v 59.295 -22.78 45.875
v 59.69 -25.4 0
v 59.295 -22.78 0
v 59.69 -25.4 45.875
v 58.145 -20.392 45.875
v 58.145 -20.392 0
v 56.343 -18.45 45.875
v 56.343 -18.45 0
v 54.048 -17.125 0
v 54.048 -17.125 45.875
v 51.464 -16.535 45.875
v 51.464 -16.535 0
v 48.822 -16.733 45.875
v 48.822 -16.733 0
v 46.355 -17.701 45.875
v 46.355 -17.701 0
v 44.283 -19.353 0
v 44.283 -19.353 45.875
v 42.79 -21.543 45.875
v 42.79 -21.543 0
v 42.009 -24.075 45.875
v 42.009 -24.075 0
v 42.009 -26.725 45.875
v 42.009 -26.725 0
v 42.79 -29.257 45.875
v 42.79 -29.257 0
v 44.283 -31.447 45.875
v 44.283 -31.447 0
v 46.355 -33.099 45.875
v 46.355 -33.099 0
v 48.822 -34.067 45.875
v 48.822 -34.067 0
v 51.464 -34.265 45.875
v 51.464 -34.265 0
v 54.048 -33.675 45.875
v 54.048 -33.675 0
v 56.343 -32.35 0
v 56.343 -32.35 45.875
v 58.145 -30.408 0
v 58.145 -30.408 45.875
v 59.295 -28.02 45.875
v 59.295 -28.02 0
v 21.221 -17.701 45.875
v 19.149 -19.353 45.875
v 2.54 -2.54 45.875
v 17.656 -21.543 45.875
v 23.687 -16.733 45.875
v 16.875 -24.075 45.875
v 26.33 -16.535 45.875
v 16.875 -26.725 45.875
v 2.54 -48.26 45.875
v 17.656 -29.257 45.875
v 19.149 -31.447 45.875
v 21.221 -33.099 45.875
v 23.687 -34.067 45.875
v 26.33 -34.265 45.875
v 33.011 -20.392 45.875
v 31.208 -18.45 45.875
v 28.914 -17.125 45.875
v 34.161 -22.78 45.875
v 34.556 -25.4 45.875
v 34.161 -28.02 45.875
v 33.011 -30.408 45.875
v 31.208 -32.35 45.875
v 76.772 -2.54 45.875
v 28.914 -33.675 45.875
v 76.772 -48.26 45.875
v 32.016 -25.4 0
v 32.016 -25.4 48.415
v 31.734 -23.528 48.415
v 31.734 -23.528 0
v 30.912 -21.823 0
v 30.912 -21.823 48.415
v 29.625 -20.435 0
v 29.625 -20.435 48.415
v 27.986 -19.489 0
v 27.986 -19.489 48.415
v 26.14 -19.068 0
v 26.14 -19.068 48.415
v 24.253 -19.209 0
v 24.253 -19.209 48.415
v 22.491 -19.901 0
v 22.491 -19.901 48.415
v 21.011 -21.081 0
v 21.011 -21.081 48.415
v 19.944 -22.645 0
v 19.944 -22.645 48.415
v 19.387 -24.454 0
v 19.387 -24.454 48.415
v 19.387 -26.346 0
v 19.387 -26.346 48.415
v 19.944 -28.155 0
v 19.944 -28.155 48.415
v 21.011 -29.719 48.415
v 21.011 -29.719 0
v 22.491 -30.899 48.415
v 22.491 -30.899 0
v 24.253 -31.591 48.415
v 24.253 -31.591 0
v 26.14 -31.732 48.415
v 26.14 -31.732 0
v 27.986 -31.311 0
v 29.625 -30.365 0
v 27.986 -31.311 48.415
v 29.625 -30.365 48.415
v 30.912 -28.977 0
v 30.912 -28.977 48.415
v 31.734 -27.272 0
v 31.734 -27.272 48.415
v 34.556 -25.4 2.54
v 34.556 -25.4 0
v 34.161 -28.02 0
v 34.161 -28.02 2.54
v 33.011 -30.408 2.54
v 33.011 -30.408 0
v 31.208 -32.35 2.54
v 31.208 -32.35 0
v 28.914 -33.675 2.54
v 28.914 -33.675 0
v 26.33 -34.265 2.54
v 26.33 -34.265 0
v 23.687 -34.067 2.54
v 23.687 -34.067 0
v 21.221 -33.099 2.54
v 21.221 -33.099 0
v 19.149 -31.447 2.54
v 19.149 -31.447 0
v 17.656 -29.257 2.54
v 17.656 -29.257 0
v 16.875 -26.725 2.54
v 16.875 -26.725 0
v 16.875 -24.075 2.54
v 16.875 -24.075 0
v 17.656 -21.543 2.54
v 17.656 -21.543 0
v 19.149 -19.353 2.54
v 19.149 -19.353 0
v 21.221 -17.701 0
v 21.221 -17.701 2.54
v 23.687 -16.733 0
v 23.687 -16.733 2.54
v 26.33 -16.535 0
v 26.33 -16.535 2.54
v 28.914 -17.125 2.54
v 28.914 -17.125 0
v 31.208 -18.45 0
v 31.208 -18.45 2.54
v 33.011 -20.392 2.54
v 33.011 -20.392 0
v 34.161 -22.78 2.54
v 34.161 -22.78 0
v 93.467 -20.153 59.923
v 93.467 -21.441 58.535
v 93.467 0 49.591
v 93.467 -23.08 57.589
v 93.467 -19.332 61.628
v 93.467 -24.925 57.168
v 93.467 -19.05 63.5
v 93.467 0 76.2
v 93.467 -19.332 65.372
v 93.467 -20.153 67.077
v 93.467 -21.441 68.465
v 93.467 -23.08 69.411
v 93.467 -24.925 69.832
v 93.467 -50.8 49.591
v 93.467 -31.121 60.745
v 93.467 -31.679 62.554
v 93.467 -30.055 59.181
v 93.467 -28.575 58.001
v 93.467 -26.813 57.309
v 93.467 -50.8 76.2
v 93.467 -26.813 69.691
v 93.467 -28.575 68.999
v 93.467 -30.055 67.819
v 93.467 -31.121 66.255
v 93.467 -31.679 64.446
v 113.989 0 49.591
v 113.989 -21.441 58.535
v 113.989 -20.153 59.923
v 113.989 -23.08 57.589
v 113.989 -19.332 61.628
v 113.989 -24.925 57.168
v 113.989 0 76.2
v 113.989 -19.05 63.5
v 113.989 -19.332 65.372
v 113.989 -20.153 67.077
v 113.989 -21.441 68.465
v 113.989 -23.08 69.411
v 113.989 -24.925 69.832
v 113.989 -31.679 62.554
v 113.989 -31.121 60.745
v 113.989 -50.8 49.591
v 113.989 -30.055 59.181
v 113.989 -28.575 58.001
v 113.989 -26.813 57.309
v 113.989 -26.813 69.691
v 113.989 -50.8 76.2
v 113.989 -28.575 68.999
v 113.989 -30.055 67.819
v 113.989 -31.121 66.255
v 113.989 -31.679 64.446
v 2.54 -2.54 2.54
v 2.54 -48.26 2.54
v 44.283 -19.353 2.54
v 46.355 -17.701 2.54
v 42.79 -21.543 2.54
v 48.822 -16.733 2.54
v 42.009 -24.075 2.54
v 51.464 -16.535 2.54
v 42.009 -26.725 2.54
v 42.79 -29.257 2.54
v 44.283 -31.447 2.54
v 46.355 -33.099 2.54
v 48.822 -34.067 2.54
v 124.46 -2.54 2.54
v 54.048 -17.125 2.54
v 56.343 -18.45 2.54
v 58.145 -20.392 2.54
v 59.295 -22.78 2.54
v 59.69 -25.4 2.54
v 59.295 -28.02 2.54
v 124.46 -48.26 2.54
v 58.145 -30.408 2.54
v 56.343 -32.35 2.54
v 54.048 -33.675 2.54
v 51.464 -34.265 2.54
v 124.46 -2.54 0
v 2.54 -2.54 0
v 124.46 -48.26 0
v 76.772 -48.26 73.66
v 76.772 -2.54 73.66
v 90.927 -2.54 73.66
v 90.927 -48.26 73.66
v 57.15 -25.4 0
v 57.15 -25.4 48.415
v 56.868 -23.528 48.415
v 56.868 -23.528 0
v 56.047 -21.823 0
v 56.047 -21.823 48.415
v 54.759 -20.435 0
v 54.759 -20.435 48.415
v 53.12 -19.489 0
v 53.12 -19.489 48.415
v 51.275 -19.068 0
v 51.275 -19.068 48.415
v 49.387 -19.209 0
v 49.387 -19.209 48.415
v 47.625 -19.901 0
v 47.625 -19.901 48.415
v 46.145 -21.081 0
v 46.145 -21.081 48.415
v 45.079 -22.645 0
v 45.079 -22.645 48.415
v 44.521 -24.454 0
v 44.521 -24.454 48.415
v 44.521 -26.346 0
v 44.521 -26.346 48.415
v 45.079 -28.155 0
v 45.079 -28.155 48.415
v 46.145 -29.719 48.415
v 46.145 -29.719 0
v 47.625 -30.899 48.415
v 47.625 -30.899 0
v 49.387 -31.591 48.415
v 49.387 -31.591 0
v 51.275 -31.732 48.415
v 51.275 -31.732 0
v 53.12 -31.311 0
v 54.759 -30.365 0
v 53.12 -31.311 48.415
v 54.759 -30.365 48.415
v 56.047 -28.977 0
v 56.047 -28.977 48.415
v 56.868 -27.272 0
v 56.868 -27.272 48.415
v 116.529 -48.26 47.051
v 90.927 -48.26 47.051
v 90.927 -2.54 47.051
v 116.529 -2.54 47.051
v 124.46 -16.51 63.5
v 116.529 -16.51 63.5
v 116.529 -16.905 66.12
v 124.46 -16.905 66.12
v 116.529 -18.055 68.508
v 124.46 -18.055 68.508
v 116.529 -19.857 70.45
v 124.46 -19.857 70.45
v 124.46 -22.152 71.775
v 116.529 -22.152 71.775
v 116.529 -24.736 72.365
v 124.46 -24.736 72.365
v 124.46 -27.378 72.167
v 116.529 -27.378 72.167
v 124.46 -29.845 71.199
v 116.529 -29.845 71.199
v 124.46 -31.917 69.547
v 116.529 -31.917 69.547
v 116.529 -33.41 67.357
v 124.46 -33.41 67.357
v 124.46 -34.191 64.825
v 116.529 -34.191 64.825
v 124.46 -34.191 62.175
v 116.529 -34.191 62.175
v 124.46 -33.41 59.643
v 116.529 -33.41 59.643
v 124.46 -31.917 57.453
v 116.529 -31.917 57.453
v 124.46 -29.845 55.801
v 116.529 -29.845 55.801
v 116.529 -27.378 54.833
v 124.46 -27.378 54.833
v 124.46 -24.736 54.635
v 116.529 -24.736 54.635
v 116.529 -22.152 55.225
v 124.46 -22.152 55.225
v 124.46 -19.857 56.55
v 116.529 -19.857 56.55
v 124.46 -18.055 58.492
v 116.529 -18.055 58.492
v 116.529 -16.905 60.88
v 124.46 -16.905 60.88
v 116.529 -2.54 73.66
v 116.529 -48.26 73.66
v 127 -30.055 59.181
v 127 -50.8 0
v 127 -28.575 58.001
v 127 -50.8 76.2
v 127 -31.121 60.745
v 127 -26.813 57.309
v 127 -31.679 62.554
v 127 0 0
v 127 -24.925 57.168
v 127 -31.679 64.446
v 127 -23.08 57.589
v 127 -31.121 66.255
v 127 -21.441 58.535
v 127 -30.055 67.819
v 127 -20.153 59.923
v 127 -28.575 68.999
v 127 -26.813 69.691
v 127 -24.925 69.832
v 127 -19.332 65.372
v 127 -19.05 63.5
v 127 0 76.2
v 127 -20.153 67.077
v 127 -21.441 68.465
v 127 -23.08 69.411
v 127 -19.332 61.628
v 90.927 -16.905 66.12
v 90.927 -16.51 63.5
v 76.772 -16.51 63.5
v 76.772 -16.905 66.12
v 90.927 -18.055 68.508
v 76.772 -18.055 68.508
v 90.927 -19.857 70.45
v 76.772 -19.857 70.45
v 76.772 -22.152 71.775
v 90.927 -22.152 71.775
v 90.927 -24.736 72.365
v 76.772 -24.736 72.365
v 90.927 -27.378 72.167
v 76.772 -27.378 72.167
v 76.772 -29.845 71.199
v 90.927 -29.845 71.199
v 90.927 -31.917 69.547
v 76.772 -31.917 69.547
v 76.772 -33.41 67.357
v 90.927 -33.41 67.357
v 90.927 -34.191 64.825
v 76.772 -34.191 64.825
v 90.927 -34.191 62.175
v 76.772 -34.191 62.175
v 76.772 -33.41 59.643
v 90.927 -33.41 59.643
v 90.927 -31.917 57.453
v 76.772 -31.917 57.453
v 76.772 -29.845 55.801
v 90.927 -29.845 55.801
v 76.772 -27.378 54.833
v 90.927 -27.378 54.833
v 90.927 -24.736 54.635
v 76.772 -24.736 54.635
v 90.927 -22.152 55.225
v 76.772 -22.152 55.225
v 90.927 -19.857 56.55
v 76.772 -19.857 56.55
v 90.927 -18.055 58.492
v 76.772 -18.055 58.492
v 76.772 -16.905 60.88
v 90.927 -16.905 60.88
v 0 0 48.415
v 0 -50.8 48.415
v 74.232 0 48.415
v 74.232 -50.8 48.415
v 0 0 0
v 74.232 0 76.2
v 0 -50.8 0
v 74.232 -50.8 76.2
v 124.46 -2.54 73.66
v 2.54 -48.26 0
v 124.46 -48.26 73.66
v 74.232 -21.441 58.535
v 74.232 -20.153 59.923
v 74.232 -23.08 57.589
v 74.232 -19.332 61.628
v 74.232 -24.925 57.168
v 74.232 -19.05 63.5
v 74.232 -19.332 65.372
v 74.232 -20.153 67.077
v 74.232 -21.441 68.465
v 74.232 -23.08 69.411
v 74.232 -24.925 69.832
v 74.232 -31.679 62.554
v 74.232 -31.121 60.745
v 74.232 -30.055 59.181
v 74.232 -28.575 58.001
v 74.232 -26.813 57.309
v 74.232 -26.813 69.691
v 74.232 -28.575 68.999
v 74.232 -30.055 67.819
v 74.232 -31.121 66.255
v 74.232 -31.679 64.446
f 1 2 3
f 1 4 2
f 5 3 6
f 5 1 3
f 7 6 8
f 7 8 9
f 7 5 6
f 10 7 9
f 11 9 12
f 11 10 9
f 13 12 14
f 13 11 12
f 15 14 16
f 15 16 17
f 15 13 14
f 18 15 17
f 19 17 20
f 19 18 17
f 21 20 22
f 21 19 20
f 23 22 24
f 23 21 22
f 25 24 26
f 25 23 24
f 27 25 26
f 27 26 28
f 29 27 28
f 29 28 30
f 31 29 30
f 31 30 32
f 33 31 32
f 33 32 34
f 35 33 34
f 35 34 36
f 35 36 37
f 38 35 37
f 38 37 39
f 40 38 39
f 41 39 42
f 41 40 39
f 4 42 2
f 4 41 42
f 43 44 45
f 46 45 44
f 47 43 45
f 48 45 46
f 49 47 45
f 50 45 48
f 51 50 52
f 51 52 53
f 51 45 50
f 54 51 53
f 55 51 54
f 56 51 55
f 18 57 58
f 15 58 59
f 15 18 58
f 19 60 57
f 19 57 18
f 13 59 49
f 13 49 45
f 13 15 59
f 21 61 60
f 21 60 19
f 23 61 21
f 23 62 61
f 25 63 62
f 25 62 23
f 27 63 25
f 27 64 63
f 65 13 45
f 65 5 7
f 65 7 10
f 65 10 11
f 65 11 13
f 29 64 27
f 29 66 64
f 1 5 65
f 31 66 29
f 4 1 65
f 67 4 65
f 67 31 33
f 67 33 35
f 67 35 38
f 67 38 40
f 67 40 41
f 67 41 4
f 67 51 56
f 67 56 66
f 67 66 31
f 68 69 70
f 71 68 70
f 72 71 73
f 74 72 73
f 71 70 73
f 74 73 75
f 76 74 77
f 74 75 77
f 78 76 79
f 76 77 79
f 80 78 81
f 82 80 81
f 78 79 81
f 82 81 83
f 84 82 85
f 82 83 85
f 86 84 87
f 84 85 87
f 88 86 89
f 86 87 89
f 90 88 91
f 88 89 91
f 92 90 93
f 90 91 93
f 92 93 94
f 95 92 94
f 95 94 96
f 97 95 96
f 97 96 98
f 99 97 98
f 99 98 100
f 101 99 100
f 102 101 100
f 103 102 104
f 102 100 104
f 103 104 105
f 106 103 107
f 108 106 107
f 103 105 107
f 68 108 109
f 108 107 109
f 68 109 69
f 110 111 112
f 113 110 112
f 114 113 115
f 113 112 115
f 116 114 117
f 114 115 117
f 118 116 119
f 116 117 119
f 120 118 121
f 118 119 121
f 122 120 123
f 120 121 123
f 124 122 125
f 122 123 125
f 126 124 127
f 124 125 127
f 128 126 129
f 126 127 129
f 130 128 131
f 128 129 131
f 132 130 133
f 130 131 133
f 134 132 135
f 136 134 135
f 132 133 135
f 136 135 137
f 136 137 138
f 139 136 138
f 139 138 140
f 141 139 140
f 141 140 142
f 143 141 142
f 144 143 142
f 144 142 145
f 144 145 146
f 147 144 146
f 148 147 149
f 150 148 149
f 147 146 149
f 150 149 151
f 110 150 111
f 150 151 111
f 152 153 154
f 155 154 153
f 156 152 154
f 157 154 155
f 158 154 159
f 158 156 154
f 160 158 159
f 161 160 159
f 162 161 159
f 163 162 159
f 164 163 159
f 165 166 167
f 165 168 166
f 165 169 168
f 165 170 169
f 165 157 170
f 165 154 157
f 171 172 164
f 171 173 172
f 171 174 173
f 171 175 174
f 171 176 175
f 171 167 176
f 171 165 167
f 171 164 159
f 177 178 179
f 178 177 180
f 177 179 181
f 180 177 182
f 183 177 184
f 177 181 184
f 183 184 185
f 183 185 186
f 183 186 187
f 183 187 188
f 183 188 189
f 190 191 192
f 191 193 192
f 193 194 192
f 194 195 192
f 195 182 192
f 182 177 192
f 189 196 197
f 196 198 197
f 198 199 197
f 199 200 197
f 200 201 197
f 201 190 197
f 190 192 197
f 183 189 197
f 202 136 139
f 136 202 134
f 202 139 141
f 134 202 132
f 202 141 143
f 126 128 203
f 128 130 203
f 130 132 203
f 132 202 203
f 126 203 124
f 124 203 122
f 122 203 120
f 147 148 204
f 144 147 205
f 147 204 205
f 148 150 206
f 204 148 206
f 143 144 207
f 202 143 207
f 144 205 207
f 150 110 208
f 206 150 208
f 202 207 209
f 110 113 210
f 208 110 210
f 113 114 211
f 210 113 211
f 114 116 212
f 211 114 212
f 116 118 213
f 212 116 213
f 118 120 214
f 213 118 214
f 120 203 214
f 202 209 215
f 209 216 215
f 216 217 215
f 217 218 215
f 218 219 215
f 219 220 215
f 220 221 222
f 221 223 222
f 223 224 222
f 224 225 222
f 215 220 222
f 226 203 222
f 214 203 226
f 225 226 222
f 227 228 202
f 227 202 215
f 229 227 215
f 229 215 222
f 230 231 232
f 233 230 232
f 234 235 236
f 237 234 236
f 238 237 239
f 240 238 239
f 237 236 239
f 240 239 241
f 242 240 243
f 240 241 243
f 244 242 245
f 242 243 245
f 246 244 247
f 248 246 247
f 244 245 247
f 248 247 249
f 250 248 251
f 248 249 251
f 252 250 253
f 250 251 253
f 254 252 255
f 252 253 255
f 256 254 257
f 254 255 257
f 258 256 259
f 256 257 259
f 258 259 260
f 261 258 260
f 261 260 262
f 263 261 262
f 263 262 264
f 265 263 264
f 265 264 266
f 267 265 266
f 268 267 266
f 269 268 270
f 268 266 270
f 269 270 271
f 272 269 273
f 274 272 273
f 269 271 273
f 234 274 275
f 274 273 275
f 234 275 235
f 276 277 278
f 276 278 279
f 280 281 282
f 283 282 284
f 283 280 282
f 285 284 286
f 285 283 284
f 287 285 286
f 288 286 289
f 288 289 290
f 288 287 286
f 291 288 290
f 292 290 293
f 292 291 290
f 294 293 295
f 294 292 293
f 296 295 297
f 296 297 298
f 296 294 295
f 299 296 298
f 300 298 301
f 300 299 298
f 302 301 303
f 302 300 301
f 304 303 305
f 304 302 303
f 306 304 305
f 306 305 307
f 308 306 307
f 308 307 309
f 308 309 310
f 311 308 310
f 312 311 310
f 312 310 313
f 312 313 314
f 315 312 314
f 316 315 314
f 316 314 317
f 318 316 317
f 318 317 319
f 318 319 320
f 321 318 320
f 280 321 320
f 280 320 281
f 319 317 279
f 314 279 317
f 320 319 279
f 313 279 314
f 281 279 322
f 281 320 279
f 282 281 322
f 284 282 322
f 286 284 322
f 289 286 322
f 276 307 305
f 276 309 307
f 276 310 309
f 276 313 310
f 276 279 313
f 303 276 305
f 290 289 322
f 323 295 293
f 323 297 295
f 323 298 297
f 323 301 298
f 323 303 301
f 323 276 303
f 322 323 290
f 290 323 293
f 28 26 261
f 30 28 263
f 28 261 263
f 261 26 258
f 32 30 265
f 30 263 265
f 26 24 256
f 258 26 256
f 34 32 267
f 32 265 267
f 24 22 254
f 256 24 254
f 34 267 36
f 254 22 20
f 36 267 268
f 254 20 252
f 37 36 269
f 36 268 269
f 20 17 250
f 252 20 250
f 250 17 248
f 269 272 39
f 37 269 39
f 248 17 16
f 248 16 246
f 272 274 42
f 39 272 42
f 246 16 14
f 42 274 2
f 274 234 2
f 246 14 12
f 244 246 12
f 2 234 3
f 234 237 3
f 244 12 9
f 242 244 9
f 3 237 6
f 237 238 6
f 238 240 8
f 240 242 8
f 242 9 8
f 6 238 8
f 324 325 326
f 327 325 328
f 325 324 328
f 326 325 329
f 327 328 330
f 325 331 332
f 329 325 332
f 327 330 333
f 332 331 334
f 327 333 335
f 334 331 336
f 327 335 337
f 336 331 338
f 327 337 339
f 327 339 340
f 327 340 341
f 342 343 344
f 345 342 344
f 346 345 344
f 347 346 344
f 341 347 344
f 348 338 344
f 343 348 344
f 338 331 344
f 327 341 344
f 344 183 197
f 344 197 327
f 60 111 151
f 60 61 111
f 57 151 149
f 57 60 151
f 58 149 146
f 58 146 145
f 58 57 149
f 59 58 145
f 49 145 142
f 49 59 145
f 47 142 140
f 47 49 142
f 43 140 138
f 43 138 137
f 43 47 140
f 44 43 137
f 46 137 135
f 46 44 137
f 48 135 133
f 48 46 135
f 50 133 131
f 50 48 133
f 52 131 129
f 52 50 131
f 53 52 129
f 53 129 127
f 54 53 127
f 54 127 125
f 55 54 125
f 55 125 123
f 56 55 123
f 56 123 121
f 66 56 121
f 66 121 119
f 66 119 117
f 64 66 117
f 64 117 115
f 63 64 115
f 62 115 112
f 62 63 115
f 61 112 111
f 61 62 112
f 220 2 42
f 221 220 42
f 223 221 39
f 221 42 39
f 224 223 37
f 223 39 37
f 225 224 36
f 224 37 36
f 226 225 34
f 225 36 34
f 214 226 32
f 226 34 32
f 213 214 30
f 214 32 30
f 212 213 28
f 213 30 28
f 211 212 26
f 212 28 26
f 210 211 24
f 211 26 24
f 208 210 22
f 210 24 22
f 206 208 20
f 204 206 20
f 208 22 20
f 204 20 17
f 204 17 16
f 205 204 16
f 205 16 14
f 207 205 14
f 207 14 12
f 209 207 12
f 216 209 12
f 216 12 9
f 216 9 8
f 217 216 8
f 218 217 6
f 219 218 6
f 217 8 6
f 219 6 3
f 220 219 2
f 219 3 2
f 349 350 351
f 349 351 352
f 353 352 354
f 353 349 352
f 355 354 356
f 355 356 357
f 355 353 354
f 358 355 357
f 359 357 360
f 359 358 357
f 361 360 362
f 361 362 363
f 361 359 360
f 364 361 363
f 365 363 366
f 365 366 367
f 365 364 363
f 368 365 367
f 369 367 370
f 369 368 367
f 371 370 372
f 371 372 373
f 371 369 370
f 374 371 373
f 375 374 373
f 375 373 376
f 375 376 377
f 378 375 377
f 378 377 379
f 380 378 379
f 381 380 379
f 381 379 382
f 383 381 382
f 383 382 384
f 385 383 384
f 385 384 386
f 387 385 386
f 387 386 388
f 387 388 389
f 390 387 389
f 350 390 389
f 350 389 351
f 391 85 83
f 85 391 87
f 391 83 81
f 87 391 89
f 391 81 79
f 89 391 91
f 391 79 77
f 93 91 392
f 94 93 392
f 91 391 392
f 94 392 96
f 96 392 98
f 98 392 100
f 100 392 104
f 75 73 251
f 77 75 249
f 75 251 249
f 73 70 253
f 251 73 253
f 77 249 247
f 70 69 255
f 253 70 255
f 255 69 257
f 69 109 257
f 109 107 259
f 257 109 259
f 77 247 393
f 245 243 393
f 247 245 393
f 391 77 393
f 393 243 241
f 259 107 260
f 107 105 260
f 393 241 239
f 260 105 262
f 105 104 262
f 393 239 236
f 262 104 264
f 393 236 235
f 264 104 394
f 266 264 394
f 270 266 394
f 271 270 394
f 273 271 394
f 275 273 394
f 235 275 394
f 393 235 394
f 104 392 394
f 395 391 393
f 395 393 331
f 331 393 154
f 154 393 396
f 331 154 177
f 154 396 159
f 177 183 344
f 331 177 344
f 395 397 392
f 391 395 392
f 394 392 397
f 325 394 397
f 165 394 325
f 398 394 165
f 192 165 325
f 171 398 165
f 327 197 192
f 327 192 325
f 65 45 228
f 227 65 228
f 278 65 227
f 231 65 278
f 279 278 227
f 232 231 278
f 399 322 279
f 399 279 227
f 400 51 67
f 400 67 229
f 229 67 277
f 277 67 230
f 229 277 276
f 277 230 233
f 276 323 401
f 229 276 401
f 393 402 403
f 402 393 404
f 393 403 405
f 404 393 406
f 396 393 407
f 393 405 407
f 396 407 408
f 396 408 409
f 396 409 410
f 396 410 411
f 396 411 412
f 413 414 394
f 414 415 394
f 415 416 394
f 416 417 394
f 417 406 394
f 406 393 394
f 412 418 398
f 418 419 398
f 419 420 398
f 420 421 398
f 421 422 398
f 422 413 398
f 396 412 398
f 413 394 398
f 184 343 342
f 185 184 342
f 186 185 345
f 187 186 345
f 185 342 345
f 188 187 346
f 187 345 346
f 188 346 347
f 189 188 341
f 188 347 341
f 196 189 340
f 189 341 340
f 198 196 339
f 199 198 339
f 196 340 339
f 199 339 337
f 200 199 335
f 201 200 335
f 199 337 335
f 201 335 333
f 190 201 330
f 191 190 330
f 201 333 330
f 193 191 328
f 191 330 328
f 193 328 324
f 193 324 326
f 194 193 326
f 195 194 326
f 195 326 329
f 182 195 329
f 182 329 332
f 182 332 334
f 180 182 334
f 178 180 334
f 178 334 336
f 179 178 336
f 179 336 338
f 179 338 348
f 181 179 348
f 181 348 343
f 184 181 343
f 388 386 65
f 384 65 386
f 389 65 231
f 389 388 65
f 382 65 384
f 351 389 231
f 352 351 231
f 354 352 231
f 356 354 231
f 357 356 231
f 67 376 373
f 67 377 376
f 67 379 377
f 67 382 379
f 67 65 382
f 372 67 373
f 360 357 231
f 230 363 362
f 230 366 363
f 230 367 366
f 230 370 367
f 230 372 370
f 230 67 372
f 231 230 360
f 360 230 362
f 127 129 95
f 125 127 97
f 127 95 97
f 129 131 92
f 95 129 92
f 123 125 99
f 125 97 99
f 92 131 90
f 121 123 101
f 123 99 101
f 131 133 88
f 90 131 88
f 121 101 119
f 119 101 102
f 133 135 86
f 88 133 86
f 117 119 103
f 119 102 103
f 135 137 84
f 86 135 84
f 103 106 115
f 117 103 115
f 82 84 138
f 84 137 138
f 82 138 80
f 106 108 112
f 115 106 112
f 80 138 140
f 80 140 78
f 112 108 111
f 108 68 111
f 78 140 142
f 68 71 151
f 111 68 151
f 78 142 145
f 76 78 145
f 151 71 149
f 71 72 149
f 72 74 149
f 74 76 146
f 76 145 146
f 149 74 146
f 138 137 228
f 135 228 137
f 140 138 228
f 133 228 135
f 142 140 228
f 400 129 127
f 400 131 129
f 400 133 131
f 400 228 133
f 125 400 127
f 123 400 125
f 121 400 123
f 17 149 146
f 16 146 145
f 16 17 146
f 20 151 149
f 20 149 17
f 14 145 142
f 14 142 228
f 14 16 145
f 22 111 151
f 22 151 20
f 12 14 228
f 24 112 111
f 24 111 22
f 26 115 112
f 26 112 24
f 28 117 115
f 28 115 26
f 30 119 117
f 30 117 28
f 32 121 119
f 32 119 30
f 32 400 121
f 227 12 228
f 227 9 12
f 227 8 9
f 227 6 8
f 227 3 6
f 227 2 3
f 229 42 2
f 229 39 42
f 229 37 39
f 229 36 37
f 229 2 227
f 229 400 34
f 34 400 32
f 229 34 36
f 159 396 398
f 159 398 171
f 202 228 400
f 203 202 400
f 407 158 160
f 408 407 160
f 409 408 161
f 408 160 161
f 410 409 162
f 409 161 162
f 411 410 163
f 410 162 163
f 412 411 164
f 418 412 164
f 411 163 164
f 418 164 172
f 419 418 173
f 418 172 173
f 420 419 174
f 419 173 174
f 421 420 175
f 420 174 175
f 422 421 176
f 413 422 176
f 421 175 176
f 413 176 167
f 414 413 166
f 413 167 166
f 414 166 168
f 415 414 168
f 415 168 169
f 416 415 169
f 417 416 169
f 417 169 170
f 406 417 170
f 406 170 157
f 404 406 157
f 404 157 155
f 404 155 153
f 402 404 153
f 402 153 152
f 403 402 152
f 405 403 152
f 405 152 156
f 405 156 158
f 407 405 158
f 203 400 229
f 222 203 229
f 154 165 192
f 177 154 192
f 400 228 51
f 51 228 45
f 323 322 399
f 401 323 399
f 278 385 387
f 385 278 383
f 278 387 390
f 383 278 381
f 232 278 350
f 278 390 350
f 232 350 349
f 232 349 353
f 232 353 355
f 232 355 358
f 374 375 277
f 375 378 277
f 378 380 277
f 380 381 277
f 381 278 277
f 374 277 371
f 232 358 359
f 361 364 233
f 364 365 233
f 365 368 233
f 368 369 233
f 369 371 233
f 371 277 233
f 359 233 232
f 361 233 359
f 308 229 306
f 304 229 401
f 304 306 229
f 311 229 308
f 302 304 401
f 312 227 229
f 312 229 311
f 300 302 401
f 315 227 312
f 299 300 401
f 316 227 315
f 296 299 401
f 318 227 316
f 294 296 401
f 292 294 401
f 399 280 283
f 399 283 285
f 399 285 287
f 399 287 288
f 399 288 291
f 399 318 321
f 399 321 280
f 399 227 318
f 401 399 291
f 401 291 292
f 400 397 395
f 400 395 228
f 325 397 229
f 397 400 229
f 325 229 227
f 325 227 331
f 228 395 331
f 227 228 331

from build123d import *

# Parameters (mm, degrees)
F0_W      = 127
F0_H      = 76.2
F1_DEPTH  = 50.8
F2_W      = 20.5224603415
F2_H      = 26.6085443914
F3_DEPTH  = 50.8
F4_W      = 74.2317289114
F4_H      = 27.7849985182
F5_DEPTH  = 50.8
F6_R      = 6.35
F7_DEPTH  = 127.001
F8_R      = 6.35
F9_DEPTH  = 48.4150014818
F10_R     = 6.35
F11_DEPTH = 48.4150014818
F13_T     = -2.54
F14_W     = 121.92
F14_H     = 45.72
F14_R     = 8.89
F15_DEPTH = 2.54


with BuildPart() as f1:
    # F0 (on Front) → F1 (new body)
    with BuildSketch(Plane.XZ):
        with Locations((63.5, 38.1)):
            Rectangle(F0_W, F0_H)
    extrude(amount=F1_DEPTH)

    # F2 (on face) → F3 (cut, through all)
    with BuildSketch(Plane.XZ.offset(50.8)):
        with Locations((103.7281528115, 62.8957278043)):
            Rectangle(F2_W, F2_H)
    extrude(amount=-F3_DEPTH, mode=Mode.SUBTRACT)

    # F4 (on face) → F5 (cut, through all)
    with BuildSketch(Plane.XZ.offset(50.8)):
        with Locations((37.1158644557, 62.3075007409)):
            Rectangle(F4_W, F4_H)
    extrude(amount=-F5_DEPTH, mode=Mode.SUBTRACT)

    # F6 (on face) → F7 (cut, through all)
    with BuildSketch(Plane.YZ.offset(127)):
        with Locations((-25.4, 63.5)):
            Circle(F6_R)
    extrude(amount=-F7_DEPTH, mode=Mode.SUBTRACT)

    # F8 (on face) → F9 (cut, through all)
    with BuildSketch(Plane.XY.offset(48.4150014818)):
        with Locations((50.8, -25.4)):
            Circle(F8_R)
    extrude(amount=-F9_DEPTH, mode=Mode.SUBTRACT)

    # F10 (on face) → F11 (cut, through all)
    with BuildSketch(Plane.XY.offset(48.4150014818)):
        with Locations((25.665640831, -25.4)):
            Circle(F10_R)
    extrude(amount=-F11_DEPTH, mode=Mode.SUBTRACT)

    # F13
    f13_openings = [f1.faces().sort_by_distance(p)[0] for p in [
        (64.532798, -25.4, 0),
    ]]
    offset(amount=F13_T, openings=f13_openings, kind=Kind.INTERSECTION)


with BuildPart() as f15:
    # F14 (on offset) → F15 (new body)
    with BuildSketch(Plane(origin=(0, 0, 0), x_dir=(1, 0, 0), z_dir=(0, 0, -1))):
        with Locations((63.5, 25.4)):
            Rectangle(F14_W, F14_H)
        with Locations((25.665640831, 25.4)):
            Circle(F14_R, mode=Mode.SUBTRACT)
        with Locations((50.8, 25.4)):
            Circle(F14_R, mode=Mode.SUBTRACT)
    extrude(amount=-F15_DEPTH)


solid = Compound([f1.part, f15.part])
